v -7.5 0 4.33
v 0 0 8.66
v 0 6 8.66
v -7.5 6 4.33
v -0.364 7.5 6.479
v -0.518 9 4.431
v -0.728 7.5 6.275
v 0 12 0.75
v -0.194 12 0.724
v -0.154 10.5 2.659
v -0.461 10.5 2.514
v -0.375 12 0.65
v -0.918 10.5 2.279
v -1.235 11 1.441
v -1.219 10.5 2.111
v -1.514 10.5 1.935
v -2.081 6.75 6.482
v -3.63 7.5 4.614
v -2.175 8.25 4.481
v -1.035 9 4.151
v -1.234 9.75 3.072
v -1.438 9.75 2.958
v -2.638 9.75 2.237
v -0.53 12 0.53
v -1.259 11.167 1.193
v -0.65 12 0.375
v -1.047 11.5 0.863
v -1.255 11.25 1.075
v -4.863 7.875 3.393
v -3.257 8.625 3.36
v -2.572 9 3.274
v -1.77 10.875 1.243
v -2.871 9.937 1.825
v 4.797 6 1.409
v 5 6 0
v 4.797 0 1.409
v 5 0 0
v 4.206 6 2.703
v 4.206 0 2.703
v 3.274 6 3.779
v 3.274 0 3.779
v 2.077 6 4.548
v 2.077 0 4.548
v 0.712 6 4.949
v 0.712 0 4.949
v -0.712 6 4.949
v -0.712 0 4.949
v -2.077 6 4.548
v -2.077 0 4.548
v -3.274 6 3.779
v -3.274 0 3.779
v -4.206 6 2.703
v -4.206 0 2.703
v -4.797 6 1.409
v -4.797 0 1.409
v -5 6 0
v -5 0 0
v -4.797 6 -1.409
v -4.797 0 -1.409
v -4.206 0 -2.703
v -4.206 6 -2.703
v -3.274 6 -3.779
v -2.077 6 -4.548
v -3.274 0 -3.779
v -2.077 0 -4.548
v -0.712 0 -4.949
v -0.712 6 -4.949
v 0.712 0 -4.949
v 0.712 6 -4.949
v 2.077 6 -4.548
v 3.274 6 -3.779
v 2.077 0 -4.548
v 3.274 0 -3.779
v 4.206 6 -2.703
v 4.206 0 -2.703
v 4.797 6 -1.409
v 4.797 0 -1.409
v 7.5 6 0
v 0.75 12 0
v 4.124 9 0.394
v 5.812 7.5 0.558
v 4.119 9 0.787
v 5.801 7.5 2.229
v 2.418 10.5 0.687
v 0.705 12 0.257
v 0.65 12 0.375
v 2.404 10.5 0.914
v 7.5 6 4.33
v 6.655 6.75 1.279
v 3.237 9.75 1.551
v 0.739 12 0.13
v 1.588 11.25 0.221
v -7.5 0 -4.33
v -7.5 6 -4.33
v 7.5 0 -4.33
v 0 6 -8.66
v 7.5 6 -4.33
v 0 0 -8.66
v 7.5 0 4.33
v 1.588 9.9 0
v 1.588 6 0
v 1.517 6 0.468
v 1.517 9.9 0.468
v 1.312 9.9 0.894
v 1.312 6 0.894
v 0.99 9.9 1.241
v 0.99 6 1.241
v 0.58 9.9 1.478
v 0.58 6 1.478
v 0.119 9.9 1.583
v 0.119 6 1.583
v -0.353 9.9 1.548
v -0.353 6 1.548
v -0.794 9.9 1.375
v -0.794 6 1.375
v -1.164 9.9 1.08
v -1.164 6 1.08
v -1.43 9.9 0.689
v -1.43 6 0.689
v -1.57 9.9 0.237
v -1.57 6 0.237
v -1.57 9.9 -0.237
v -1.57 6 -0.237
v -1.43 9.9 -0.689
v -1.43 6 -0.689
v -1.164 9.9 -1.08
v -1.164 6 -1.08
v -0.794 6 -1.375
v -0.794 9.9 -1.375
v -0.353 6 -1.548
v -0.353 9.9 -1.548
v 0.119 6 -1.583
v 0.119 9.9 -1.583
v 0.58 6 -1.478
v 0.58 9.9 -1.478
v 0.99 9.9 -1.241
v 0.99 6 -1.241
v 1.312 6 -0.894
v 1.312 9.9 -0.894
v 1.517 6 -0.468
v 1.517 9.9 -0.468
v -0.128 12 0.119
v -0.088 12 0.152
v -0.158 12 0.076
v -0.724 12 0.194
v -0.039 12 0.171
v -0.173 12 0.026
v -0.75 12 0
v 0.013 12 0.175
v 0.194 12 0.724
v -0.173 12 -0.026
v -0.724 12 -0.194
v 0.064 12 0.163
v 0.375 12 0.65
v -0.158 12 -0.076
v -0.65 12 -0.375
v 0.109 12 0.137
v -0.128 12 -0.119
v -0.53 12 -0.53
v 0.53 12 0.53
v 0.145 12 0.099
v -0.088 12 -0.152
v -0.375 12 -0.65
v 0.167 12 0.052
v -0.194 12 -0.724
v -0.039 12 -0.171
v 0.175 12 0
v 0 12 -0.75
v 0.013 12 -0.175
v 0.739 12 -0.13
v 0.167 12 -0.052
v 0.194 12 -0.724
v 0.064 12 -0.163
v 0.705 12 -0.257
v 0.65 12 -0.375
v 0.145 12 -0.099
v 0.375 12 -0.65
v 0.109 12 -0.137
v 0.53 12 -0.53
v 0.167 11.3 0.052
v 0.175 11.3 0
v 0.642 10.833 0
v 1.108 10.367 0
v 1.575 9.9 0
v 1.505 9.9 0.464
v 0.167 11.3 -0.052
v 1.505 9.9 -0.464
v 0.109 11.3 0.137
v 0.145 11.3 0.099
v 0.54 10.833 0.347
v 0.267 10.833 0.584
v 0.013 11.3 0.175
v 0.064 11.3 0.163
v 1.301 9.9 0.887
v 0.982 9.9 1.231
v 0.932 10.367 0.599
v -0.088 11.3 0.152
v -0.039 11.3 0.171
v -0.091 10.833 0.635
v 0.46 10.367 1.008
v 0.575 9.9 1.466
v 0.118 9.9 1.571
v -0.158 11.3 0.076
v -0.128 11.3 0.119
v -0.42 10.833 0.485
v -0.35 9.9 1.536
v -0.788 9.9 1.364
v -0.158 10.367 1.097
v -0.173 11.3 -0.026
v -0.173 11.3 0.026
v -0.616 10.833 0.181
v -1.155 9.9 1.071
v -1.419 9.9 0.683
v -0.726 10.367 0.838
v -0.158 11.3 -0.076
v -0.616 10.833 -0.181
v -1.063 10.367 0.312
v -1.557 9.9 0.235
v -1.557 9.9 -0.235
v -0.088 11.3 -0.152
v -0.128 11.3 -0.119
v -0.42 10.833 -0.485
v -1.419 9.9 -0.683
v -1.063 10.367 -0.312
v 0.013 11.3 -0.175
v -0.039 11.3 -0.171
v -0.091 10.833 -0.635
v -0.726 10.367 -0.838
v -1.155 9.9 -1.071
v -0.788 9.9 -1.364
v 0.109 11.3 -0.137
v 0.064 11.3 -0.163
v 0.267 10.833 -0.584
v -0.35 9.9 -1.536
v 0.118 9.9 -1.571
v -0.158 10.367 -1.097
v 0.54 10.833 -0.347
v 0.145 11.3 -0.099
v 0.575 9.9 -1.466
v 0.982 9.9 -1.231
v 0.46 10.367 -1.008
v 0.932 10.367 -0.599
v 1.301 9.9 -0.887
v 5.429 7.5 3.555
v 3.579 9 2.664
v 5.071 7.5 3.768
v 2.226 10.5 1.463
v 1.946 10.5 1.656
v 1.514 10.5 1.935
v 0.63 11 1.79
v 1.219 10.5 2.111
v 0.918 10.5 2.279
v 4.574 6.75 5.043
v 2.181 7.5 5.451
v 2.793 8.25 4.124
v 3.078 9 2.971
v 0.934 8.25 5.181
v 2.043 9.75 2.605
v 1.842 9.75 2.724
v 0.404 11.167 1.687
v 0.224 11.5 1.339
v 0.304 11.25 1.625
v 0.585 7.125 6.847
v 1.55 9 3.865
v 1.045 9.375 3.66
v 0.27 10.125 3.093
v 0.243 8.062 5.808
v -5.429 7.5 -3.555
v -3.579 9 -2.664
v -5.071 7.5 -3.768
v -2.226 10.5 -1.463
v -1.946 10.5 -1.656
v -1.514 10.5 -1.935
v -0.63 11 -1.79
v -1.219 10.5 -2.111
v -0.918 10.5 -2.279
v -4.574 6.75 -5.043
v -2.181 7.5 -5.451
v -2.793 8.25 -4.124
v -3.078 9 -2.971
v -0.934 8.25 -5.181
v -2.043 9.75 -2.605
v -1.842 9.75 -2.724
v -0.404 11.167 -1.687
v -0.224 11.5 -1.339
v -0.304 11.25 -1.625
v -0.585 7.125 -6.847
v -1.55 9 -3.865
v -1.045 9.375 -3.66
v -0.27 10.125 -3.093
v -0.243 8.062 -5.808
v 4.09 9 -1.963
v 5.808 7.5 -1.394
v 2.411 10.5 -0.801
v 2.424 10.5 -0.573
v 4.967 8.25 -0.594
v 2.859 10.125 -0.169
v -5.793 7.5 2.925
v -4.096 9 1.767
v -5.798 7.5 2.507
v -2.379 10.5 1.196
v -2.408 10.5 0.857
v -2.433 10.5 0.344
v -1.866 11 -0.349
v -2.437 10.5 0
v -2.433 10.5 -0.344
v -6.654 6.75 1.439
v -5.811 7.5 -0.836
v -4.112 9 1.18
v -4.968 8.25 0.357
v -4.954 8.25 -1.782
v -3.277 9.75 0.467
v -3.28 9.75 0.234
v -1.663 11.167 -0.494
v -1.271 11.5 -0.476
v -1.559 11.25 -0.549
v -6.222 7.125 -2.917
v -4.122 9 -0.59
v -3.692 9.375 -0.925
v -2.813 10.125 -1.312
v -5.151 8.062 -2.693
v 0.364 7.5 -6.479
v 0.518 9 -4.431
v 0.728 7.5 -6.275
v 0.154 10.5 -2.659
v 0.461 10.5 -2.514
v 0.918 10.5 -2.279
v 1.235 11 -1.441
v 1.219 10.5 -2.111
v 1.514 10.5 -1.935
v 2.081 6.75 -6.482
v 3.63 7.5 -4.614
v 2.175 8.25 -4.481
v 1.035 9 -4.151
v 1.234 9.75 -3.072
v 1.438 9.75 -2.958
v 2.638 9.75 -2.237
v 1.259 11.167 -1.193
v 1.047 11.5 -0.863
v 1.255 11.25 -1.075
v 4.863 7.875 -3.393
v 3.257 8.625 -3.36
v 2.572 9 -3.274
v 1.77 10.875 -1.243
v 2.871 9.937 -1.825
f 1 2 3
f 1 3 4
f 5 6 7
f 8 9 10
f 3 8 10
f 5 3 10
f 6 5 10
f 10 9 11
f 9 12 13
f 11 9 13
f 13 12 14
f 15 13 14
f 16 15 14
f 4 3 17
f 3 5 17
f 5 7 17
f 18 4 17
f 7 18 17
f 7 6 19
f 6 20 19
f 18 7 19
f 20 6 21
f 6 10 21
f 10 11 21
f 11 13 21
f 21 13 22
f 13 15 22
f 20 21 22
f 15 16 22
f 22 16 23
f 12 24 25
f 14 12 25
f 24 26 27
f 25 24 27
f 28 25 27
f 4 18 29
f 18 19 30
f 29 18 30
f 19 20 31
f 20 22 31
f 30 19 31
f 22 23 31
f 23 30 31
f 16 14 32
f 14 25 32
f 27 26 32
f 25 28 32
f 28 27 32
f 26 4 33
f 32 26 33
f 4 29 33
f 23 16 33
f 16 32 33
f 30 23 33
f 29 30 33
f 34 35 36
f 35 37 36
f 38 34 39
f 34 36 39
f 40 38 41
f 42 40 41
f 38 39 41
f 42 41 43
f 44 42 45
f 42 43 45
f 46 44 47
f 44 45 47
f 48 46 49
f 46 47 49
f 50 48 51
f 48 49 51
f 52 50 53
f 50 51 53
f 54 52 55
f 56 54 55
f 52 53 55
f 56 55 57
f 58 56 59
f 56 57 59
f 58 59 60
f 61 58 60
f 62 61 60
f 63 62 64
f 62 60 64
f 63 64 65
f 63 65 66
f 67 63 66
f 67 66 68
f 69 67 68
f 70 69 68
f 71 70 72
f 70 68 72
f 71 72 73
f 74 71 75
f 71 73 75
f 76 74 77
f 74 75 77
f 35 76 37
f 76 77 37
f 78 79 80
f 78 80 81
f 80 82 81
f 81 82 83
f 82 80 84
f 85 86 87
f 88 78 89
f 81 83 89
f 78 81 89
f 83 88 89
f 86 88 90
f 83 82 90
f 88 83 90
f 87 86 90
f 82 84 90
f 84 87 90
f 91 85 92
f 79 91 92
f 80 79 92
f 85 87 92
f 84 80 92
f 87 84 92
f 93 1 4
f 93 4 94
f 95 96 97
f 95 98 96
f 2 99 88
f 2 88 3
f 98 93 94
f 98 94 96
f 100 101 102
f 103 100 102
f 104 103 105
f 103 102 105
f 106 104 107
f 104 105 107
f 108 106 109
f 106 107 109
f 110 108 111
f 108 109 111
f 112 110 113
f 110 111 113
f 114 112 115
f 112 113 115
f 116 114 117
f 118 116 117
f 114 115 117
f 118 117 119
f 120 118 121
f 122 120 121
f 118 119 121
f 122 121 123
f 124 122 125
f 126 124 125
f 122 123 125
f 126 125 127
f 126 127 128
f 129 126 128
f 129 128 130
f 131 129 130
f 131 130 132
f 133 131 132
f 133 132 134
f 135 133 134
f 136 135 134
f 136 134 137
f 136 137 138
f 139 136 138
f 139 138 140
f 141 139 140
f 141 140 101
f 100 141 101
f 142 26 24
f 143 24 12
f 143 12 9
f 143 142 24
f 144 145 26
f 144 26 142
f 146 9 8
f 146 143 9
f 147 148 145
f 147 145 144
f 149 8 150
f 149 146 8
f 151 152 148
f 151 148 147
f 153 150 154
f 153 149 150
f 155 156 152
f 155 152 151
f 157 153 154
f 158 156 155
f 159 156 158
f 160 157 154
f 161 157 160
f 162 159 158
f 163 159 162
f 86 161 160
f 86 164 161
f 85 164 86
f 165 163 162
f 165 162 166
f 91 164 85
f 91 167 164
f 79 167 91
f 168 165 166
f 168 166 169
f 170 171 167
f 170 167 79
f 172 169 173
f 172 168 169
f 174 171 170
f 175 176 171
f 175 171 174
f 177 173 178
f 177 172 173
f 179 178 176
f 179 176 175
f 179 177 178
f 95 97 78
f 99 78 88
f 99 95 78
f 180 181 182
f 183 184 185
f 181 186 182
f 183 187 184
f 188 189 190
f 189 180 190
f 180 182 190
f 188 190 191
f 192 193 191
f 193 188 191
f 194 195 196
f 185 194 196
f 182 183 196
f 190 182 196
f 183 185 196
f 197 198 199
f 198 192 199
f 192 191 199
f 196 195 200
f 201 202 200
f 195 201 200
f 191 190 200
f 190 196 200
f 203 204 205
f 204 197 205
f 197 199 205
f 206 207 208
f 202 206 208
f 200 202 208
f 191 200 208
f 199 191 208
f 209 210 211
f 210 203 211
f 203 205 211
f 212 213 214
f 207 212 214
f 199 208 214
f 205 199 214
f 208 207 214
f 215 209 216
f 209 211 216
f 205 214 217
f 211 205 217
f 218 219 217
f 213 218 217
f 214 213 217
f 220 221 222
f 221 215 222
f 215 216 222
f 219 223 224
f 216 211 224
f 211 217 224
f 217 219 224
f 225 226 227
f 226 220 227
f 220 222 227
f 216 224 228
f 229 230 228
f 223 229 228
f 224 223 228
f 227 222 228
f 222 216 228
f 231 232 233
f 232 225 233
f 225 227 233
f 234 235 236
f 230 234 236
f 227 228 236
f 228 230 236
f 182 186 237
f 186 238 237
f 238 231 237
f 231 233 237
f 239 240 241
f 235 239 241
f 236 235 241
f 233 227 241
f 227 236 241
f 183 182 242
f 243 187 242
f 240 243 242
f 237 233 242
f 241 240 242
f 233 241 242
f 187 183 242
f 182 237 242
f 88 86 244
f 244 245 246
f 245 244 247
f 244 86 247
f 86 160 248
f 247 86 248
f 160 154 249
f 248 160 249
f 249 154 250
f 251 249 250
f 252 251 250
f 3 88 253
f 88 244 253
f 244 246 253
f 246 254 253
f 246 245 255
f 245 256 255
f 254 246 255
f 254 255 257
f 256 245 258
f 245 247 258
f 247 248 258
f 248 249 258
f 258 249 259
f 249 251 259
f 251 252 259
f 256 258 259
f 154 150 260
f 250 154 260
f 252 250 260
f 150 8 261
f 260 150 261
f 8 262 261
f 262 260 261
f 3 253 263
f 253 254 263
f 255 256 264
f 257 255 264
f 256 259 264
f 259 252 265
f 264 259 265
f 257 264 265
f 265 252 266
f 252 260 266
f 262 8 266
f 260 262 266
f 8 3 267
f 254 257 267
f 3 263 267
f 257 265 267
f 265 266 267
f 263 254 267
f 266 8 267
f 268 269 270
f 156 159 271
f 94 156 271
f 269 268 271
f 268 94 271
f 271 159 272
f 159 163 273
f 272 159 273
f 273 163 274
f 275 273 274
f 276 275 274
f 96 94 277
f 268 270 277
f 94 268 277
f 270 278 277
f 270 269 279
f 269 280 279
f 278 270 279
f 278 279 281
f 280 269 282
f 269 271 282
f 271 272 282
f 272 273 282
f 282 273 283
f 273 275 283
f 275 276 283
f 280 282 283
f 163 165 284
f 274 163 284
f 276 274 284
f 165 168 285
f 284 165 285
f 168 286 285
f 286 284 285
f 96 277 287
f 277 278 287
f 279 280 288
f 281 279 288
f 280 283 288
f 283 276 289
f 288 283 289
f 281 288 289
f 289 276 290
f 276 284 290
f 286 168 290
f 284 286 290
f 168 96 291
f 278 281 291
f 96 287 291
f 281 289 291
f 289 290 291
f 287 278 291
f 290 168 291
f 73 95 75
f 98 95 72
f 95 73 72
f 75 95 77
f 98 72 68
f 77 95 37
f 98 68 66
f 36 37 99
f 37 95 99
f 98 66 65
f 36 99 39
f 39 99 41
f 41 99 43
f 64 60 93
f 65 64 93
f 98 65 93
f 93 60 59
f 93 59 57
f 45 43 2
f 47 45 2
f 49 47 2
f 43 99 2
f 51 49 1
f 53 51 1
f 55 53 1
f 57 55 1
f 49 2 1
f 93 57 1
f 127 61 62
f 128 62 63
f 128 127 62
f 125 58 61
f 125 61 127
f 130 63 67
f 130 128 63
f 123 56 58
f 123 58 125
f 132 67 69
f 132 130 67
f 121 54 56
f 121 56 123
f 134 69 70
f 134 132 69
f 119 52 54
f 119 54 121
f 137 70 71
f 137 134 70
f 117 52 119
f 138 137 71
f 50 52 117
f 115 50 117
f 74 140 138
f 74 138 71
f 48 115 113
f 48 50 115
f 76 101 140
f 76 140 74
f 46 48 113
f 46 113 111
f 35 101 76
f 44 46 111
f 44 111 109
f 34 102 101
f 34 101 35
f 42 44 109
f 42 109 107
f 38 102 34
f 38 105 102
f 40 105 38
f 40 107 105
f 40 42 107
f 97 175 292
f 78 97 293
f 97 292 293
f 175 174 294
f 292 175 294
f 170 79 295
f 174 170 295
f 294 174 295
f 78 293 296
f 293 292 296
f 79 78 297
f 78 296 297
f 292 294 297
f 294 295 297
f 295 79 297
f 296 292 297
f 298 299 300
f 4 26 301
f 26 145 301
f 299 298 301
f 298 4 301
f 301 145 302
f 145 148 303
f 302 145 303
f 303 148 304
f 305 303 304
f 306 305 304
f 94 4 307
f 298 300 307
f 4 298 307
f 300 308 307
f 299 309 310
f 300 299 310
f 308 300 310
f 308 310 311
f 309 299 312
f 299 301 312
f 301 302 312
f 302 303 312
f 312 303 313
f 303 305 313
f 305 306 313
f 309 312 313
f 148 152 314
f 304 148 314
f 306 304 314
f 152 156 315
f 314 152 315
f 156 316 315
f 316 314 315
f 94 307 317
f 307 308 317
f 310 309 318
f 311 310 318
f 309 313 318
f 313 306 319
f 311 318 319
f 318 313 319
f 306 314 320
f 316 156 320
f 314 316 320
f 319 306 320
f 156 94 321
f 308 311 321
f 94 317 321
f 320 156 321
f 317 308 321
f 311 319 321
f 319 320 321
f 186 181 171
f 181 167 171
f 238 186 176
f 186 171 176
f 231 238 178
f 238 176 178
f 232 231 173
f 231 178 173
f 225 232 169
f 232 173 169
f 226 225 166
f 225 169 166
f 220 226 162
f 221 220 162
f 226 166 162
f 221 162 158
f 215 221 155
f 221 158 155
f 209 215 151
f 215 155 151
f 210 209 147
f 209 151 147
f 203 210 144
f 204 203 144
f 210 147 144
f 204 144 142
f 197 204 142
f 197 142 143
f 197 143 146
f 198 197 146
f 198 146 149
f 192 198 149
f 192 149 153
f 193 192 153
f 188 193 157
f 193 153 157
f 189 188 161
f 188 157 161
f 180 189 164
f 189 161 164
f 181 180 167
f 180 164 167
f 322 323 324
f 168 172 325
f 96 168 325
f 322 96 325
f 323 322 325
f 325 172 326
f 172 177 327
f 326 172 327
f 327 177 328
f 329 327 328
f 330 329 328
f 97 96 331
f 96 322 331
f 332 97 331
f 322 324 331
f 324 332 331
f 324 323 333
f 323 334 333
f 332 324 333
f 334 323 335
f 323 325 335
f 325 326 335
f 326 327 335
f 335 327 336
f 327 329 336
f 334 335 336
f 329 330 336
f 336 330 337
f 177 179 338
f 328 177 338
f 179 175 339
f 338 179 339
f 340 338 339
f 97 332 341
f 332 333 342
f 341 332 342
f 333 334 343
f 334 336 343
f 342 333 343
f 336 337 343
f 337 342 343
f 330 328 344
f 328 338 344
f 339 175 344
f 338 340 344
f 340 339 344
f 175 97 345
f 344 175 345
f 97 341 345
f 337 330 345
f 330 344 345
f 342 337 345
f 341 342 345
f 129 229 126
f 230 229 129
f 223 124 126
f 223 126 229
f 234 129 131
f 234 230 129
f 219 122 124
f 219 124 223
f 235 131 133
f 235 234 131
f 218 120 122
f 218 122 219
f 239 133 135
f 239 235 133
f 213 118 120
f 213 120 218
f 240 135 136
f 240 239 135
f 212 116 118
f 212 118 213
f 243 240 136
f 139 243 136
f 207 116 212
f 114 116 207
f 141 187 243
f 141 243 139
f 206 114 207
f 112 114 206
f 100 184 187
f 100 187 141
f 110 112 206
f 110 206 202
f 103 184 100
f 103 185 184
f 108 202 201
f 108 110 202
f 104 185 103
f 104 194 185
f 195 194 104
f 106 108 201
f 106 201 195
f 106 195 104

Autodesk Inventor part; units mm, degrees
ref_plane "YZ Plane" through (0, 0, 0) normal (1, 0, 0) x (0, 1, 0)
ref_plane "XZ Plane" through (0, 0, 0) normal (0, 1, 0) x (-1, 0, 0)
sketch "Sketch1" plane through (0, 0, 0) normal (0, 1, 0) x (-1, 0, 0)
  line L0 (0, 8.6603) -> (7.5, 4.3301)
  line L1 (7.5, 4.3301) -> (7.5, -4.3301)
  line L2 (7.5, -4.3301) -> (0, -8.6603)
  line L3 (0, -8.6603) -> (-7.5, -4.3301)
  line L4 (-7.5, -4.3301) -> (-7.5, 4.3301)
  line L5 (-7.5, 4.3301) -> (0, 8.6603)
  point P0 (0, 0)
  point P1 (0, 0)
  dimension "d0" = 7.5
extrude "Extrusion1" add sketch "Sketch1" along normal blind 6
ref_plane "Work Plane1" through (0, 12, 0) normal (0, 1, 0) x (1, 0, 0)
sketch "Sketch3" plane through (0, 12, 0) normal (0, 1, 0) x (1, 0, 0)
  circle A0 centre (0, 0) radius 0.75
  dimension "d4" = 1.5
loft "Loft1" add profiles "Sketch3" section 1 edges at (-3.75, 6, 6.4952) (3.75, 6, 6.4952) (7.5, 6, 0) (3.75, 6, -6.4952) (-3.75, 6, -6.4952) (-7.5, 6, 0)
sketch "Sketch4" plane through (0, 0, 0) normal (0, -1, 0) x (1, 0, 0)
  circle A0 centre (0, 0) radius 5
  dimension "d9" = 10
extrude "Extrusion2" cut sketch "Sketch4" against normal blind 6
thread "Thread1" size "M10x1.5" class "6H" standard "ANSI Metric M Profile" full length
sketch "Sketch5" plane through (0, 6, 0) normal (0, -1, 0) x (1, 0, 0)
  circle A0 centre (0, 0) radius 5 projected
  circle A1 centre (0, 0) radius 1.5875
  dimension "d14" = 3.175
sketch "Sketch6" plane through (0, 12, 0) normal (0, 1, 0) x (1, 0, 0)
  arc A0 (-0.6495, 0.375) -> (-0.6495, -0.375) centre (0, 0) ccw projected
  circle A1 centre (0, 0) radius 0.175
  dimension "d15" = 0.35
extrude "Extrusion3" cut sketch "Sketch6" against normal blind 7.75
extrude "Extrusion4" cut sketch "Sketch5" against normal blind 3.9 contours A1
chamfer "Chamfer1" distance 1.4 angle 45 1 edges at (-0.175, 9.9, 0)
properties part number "Nozzle"
